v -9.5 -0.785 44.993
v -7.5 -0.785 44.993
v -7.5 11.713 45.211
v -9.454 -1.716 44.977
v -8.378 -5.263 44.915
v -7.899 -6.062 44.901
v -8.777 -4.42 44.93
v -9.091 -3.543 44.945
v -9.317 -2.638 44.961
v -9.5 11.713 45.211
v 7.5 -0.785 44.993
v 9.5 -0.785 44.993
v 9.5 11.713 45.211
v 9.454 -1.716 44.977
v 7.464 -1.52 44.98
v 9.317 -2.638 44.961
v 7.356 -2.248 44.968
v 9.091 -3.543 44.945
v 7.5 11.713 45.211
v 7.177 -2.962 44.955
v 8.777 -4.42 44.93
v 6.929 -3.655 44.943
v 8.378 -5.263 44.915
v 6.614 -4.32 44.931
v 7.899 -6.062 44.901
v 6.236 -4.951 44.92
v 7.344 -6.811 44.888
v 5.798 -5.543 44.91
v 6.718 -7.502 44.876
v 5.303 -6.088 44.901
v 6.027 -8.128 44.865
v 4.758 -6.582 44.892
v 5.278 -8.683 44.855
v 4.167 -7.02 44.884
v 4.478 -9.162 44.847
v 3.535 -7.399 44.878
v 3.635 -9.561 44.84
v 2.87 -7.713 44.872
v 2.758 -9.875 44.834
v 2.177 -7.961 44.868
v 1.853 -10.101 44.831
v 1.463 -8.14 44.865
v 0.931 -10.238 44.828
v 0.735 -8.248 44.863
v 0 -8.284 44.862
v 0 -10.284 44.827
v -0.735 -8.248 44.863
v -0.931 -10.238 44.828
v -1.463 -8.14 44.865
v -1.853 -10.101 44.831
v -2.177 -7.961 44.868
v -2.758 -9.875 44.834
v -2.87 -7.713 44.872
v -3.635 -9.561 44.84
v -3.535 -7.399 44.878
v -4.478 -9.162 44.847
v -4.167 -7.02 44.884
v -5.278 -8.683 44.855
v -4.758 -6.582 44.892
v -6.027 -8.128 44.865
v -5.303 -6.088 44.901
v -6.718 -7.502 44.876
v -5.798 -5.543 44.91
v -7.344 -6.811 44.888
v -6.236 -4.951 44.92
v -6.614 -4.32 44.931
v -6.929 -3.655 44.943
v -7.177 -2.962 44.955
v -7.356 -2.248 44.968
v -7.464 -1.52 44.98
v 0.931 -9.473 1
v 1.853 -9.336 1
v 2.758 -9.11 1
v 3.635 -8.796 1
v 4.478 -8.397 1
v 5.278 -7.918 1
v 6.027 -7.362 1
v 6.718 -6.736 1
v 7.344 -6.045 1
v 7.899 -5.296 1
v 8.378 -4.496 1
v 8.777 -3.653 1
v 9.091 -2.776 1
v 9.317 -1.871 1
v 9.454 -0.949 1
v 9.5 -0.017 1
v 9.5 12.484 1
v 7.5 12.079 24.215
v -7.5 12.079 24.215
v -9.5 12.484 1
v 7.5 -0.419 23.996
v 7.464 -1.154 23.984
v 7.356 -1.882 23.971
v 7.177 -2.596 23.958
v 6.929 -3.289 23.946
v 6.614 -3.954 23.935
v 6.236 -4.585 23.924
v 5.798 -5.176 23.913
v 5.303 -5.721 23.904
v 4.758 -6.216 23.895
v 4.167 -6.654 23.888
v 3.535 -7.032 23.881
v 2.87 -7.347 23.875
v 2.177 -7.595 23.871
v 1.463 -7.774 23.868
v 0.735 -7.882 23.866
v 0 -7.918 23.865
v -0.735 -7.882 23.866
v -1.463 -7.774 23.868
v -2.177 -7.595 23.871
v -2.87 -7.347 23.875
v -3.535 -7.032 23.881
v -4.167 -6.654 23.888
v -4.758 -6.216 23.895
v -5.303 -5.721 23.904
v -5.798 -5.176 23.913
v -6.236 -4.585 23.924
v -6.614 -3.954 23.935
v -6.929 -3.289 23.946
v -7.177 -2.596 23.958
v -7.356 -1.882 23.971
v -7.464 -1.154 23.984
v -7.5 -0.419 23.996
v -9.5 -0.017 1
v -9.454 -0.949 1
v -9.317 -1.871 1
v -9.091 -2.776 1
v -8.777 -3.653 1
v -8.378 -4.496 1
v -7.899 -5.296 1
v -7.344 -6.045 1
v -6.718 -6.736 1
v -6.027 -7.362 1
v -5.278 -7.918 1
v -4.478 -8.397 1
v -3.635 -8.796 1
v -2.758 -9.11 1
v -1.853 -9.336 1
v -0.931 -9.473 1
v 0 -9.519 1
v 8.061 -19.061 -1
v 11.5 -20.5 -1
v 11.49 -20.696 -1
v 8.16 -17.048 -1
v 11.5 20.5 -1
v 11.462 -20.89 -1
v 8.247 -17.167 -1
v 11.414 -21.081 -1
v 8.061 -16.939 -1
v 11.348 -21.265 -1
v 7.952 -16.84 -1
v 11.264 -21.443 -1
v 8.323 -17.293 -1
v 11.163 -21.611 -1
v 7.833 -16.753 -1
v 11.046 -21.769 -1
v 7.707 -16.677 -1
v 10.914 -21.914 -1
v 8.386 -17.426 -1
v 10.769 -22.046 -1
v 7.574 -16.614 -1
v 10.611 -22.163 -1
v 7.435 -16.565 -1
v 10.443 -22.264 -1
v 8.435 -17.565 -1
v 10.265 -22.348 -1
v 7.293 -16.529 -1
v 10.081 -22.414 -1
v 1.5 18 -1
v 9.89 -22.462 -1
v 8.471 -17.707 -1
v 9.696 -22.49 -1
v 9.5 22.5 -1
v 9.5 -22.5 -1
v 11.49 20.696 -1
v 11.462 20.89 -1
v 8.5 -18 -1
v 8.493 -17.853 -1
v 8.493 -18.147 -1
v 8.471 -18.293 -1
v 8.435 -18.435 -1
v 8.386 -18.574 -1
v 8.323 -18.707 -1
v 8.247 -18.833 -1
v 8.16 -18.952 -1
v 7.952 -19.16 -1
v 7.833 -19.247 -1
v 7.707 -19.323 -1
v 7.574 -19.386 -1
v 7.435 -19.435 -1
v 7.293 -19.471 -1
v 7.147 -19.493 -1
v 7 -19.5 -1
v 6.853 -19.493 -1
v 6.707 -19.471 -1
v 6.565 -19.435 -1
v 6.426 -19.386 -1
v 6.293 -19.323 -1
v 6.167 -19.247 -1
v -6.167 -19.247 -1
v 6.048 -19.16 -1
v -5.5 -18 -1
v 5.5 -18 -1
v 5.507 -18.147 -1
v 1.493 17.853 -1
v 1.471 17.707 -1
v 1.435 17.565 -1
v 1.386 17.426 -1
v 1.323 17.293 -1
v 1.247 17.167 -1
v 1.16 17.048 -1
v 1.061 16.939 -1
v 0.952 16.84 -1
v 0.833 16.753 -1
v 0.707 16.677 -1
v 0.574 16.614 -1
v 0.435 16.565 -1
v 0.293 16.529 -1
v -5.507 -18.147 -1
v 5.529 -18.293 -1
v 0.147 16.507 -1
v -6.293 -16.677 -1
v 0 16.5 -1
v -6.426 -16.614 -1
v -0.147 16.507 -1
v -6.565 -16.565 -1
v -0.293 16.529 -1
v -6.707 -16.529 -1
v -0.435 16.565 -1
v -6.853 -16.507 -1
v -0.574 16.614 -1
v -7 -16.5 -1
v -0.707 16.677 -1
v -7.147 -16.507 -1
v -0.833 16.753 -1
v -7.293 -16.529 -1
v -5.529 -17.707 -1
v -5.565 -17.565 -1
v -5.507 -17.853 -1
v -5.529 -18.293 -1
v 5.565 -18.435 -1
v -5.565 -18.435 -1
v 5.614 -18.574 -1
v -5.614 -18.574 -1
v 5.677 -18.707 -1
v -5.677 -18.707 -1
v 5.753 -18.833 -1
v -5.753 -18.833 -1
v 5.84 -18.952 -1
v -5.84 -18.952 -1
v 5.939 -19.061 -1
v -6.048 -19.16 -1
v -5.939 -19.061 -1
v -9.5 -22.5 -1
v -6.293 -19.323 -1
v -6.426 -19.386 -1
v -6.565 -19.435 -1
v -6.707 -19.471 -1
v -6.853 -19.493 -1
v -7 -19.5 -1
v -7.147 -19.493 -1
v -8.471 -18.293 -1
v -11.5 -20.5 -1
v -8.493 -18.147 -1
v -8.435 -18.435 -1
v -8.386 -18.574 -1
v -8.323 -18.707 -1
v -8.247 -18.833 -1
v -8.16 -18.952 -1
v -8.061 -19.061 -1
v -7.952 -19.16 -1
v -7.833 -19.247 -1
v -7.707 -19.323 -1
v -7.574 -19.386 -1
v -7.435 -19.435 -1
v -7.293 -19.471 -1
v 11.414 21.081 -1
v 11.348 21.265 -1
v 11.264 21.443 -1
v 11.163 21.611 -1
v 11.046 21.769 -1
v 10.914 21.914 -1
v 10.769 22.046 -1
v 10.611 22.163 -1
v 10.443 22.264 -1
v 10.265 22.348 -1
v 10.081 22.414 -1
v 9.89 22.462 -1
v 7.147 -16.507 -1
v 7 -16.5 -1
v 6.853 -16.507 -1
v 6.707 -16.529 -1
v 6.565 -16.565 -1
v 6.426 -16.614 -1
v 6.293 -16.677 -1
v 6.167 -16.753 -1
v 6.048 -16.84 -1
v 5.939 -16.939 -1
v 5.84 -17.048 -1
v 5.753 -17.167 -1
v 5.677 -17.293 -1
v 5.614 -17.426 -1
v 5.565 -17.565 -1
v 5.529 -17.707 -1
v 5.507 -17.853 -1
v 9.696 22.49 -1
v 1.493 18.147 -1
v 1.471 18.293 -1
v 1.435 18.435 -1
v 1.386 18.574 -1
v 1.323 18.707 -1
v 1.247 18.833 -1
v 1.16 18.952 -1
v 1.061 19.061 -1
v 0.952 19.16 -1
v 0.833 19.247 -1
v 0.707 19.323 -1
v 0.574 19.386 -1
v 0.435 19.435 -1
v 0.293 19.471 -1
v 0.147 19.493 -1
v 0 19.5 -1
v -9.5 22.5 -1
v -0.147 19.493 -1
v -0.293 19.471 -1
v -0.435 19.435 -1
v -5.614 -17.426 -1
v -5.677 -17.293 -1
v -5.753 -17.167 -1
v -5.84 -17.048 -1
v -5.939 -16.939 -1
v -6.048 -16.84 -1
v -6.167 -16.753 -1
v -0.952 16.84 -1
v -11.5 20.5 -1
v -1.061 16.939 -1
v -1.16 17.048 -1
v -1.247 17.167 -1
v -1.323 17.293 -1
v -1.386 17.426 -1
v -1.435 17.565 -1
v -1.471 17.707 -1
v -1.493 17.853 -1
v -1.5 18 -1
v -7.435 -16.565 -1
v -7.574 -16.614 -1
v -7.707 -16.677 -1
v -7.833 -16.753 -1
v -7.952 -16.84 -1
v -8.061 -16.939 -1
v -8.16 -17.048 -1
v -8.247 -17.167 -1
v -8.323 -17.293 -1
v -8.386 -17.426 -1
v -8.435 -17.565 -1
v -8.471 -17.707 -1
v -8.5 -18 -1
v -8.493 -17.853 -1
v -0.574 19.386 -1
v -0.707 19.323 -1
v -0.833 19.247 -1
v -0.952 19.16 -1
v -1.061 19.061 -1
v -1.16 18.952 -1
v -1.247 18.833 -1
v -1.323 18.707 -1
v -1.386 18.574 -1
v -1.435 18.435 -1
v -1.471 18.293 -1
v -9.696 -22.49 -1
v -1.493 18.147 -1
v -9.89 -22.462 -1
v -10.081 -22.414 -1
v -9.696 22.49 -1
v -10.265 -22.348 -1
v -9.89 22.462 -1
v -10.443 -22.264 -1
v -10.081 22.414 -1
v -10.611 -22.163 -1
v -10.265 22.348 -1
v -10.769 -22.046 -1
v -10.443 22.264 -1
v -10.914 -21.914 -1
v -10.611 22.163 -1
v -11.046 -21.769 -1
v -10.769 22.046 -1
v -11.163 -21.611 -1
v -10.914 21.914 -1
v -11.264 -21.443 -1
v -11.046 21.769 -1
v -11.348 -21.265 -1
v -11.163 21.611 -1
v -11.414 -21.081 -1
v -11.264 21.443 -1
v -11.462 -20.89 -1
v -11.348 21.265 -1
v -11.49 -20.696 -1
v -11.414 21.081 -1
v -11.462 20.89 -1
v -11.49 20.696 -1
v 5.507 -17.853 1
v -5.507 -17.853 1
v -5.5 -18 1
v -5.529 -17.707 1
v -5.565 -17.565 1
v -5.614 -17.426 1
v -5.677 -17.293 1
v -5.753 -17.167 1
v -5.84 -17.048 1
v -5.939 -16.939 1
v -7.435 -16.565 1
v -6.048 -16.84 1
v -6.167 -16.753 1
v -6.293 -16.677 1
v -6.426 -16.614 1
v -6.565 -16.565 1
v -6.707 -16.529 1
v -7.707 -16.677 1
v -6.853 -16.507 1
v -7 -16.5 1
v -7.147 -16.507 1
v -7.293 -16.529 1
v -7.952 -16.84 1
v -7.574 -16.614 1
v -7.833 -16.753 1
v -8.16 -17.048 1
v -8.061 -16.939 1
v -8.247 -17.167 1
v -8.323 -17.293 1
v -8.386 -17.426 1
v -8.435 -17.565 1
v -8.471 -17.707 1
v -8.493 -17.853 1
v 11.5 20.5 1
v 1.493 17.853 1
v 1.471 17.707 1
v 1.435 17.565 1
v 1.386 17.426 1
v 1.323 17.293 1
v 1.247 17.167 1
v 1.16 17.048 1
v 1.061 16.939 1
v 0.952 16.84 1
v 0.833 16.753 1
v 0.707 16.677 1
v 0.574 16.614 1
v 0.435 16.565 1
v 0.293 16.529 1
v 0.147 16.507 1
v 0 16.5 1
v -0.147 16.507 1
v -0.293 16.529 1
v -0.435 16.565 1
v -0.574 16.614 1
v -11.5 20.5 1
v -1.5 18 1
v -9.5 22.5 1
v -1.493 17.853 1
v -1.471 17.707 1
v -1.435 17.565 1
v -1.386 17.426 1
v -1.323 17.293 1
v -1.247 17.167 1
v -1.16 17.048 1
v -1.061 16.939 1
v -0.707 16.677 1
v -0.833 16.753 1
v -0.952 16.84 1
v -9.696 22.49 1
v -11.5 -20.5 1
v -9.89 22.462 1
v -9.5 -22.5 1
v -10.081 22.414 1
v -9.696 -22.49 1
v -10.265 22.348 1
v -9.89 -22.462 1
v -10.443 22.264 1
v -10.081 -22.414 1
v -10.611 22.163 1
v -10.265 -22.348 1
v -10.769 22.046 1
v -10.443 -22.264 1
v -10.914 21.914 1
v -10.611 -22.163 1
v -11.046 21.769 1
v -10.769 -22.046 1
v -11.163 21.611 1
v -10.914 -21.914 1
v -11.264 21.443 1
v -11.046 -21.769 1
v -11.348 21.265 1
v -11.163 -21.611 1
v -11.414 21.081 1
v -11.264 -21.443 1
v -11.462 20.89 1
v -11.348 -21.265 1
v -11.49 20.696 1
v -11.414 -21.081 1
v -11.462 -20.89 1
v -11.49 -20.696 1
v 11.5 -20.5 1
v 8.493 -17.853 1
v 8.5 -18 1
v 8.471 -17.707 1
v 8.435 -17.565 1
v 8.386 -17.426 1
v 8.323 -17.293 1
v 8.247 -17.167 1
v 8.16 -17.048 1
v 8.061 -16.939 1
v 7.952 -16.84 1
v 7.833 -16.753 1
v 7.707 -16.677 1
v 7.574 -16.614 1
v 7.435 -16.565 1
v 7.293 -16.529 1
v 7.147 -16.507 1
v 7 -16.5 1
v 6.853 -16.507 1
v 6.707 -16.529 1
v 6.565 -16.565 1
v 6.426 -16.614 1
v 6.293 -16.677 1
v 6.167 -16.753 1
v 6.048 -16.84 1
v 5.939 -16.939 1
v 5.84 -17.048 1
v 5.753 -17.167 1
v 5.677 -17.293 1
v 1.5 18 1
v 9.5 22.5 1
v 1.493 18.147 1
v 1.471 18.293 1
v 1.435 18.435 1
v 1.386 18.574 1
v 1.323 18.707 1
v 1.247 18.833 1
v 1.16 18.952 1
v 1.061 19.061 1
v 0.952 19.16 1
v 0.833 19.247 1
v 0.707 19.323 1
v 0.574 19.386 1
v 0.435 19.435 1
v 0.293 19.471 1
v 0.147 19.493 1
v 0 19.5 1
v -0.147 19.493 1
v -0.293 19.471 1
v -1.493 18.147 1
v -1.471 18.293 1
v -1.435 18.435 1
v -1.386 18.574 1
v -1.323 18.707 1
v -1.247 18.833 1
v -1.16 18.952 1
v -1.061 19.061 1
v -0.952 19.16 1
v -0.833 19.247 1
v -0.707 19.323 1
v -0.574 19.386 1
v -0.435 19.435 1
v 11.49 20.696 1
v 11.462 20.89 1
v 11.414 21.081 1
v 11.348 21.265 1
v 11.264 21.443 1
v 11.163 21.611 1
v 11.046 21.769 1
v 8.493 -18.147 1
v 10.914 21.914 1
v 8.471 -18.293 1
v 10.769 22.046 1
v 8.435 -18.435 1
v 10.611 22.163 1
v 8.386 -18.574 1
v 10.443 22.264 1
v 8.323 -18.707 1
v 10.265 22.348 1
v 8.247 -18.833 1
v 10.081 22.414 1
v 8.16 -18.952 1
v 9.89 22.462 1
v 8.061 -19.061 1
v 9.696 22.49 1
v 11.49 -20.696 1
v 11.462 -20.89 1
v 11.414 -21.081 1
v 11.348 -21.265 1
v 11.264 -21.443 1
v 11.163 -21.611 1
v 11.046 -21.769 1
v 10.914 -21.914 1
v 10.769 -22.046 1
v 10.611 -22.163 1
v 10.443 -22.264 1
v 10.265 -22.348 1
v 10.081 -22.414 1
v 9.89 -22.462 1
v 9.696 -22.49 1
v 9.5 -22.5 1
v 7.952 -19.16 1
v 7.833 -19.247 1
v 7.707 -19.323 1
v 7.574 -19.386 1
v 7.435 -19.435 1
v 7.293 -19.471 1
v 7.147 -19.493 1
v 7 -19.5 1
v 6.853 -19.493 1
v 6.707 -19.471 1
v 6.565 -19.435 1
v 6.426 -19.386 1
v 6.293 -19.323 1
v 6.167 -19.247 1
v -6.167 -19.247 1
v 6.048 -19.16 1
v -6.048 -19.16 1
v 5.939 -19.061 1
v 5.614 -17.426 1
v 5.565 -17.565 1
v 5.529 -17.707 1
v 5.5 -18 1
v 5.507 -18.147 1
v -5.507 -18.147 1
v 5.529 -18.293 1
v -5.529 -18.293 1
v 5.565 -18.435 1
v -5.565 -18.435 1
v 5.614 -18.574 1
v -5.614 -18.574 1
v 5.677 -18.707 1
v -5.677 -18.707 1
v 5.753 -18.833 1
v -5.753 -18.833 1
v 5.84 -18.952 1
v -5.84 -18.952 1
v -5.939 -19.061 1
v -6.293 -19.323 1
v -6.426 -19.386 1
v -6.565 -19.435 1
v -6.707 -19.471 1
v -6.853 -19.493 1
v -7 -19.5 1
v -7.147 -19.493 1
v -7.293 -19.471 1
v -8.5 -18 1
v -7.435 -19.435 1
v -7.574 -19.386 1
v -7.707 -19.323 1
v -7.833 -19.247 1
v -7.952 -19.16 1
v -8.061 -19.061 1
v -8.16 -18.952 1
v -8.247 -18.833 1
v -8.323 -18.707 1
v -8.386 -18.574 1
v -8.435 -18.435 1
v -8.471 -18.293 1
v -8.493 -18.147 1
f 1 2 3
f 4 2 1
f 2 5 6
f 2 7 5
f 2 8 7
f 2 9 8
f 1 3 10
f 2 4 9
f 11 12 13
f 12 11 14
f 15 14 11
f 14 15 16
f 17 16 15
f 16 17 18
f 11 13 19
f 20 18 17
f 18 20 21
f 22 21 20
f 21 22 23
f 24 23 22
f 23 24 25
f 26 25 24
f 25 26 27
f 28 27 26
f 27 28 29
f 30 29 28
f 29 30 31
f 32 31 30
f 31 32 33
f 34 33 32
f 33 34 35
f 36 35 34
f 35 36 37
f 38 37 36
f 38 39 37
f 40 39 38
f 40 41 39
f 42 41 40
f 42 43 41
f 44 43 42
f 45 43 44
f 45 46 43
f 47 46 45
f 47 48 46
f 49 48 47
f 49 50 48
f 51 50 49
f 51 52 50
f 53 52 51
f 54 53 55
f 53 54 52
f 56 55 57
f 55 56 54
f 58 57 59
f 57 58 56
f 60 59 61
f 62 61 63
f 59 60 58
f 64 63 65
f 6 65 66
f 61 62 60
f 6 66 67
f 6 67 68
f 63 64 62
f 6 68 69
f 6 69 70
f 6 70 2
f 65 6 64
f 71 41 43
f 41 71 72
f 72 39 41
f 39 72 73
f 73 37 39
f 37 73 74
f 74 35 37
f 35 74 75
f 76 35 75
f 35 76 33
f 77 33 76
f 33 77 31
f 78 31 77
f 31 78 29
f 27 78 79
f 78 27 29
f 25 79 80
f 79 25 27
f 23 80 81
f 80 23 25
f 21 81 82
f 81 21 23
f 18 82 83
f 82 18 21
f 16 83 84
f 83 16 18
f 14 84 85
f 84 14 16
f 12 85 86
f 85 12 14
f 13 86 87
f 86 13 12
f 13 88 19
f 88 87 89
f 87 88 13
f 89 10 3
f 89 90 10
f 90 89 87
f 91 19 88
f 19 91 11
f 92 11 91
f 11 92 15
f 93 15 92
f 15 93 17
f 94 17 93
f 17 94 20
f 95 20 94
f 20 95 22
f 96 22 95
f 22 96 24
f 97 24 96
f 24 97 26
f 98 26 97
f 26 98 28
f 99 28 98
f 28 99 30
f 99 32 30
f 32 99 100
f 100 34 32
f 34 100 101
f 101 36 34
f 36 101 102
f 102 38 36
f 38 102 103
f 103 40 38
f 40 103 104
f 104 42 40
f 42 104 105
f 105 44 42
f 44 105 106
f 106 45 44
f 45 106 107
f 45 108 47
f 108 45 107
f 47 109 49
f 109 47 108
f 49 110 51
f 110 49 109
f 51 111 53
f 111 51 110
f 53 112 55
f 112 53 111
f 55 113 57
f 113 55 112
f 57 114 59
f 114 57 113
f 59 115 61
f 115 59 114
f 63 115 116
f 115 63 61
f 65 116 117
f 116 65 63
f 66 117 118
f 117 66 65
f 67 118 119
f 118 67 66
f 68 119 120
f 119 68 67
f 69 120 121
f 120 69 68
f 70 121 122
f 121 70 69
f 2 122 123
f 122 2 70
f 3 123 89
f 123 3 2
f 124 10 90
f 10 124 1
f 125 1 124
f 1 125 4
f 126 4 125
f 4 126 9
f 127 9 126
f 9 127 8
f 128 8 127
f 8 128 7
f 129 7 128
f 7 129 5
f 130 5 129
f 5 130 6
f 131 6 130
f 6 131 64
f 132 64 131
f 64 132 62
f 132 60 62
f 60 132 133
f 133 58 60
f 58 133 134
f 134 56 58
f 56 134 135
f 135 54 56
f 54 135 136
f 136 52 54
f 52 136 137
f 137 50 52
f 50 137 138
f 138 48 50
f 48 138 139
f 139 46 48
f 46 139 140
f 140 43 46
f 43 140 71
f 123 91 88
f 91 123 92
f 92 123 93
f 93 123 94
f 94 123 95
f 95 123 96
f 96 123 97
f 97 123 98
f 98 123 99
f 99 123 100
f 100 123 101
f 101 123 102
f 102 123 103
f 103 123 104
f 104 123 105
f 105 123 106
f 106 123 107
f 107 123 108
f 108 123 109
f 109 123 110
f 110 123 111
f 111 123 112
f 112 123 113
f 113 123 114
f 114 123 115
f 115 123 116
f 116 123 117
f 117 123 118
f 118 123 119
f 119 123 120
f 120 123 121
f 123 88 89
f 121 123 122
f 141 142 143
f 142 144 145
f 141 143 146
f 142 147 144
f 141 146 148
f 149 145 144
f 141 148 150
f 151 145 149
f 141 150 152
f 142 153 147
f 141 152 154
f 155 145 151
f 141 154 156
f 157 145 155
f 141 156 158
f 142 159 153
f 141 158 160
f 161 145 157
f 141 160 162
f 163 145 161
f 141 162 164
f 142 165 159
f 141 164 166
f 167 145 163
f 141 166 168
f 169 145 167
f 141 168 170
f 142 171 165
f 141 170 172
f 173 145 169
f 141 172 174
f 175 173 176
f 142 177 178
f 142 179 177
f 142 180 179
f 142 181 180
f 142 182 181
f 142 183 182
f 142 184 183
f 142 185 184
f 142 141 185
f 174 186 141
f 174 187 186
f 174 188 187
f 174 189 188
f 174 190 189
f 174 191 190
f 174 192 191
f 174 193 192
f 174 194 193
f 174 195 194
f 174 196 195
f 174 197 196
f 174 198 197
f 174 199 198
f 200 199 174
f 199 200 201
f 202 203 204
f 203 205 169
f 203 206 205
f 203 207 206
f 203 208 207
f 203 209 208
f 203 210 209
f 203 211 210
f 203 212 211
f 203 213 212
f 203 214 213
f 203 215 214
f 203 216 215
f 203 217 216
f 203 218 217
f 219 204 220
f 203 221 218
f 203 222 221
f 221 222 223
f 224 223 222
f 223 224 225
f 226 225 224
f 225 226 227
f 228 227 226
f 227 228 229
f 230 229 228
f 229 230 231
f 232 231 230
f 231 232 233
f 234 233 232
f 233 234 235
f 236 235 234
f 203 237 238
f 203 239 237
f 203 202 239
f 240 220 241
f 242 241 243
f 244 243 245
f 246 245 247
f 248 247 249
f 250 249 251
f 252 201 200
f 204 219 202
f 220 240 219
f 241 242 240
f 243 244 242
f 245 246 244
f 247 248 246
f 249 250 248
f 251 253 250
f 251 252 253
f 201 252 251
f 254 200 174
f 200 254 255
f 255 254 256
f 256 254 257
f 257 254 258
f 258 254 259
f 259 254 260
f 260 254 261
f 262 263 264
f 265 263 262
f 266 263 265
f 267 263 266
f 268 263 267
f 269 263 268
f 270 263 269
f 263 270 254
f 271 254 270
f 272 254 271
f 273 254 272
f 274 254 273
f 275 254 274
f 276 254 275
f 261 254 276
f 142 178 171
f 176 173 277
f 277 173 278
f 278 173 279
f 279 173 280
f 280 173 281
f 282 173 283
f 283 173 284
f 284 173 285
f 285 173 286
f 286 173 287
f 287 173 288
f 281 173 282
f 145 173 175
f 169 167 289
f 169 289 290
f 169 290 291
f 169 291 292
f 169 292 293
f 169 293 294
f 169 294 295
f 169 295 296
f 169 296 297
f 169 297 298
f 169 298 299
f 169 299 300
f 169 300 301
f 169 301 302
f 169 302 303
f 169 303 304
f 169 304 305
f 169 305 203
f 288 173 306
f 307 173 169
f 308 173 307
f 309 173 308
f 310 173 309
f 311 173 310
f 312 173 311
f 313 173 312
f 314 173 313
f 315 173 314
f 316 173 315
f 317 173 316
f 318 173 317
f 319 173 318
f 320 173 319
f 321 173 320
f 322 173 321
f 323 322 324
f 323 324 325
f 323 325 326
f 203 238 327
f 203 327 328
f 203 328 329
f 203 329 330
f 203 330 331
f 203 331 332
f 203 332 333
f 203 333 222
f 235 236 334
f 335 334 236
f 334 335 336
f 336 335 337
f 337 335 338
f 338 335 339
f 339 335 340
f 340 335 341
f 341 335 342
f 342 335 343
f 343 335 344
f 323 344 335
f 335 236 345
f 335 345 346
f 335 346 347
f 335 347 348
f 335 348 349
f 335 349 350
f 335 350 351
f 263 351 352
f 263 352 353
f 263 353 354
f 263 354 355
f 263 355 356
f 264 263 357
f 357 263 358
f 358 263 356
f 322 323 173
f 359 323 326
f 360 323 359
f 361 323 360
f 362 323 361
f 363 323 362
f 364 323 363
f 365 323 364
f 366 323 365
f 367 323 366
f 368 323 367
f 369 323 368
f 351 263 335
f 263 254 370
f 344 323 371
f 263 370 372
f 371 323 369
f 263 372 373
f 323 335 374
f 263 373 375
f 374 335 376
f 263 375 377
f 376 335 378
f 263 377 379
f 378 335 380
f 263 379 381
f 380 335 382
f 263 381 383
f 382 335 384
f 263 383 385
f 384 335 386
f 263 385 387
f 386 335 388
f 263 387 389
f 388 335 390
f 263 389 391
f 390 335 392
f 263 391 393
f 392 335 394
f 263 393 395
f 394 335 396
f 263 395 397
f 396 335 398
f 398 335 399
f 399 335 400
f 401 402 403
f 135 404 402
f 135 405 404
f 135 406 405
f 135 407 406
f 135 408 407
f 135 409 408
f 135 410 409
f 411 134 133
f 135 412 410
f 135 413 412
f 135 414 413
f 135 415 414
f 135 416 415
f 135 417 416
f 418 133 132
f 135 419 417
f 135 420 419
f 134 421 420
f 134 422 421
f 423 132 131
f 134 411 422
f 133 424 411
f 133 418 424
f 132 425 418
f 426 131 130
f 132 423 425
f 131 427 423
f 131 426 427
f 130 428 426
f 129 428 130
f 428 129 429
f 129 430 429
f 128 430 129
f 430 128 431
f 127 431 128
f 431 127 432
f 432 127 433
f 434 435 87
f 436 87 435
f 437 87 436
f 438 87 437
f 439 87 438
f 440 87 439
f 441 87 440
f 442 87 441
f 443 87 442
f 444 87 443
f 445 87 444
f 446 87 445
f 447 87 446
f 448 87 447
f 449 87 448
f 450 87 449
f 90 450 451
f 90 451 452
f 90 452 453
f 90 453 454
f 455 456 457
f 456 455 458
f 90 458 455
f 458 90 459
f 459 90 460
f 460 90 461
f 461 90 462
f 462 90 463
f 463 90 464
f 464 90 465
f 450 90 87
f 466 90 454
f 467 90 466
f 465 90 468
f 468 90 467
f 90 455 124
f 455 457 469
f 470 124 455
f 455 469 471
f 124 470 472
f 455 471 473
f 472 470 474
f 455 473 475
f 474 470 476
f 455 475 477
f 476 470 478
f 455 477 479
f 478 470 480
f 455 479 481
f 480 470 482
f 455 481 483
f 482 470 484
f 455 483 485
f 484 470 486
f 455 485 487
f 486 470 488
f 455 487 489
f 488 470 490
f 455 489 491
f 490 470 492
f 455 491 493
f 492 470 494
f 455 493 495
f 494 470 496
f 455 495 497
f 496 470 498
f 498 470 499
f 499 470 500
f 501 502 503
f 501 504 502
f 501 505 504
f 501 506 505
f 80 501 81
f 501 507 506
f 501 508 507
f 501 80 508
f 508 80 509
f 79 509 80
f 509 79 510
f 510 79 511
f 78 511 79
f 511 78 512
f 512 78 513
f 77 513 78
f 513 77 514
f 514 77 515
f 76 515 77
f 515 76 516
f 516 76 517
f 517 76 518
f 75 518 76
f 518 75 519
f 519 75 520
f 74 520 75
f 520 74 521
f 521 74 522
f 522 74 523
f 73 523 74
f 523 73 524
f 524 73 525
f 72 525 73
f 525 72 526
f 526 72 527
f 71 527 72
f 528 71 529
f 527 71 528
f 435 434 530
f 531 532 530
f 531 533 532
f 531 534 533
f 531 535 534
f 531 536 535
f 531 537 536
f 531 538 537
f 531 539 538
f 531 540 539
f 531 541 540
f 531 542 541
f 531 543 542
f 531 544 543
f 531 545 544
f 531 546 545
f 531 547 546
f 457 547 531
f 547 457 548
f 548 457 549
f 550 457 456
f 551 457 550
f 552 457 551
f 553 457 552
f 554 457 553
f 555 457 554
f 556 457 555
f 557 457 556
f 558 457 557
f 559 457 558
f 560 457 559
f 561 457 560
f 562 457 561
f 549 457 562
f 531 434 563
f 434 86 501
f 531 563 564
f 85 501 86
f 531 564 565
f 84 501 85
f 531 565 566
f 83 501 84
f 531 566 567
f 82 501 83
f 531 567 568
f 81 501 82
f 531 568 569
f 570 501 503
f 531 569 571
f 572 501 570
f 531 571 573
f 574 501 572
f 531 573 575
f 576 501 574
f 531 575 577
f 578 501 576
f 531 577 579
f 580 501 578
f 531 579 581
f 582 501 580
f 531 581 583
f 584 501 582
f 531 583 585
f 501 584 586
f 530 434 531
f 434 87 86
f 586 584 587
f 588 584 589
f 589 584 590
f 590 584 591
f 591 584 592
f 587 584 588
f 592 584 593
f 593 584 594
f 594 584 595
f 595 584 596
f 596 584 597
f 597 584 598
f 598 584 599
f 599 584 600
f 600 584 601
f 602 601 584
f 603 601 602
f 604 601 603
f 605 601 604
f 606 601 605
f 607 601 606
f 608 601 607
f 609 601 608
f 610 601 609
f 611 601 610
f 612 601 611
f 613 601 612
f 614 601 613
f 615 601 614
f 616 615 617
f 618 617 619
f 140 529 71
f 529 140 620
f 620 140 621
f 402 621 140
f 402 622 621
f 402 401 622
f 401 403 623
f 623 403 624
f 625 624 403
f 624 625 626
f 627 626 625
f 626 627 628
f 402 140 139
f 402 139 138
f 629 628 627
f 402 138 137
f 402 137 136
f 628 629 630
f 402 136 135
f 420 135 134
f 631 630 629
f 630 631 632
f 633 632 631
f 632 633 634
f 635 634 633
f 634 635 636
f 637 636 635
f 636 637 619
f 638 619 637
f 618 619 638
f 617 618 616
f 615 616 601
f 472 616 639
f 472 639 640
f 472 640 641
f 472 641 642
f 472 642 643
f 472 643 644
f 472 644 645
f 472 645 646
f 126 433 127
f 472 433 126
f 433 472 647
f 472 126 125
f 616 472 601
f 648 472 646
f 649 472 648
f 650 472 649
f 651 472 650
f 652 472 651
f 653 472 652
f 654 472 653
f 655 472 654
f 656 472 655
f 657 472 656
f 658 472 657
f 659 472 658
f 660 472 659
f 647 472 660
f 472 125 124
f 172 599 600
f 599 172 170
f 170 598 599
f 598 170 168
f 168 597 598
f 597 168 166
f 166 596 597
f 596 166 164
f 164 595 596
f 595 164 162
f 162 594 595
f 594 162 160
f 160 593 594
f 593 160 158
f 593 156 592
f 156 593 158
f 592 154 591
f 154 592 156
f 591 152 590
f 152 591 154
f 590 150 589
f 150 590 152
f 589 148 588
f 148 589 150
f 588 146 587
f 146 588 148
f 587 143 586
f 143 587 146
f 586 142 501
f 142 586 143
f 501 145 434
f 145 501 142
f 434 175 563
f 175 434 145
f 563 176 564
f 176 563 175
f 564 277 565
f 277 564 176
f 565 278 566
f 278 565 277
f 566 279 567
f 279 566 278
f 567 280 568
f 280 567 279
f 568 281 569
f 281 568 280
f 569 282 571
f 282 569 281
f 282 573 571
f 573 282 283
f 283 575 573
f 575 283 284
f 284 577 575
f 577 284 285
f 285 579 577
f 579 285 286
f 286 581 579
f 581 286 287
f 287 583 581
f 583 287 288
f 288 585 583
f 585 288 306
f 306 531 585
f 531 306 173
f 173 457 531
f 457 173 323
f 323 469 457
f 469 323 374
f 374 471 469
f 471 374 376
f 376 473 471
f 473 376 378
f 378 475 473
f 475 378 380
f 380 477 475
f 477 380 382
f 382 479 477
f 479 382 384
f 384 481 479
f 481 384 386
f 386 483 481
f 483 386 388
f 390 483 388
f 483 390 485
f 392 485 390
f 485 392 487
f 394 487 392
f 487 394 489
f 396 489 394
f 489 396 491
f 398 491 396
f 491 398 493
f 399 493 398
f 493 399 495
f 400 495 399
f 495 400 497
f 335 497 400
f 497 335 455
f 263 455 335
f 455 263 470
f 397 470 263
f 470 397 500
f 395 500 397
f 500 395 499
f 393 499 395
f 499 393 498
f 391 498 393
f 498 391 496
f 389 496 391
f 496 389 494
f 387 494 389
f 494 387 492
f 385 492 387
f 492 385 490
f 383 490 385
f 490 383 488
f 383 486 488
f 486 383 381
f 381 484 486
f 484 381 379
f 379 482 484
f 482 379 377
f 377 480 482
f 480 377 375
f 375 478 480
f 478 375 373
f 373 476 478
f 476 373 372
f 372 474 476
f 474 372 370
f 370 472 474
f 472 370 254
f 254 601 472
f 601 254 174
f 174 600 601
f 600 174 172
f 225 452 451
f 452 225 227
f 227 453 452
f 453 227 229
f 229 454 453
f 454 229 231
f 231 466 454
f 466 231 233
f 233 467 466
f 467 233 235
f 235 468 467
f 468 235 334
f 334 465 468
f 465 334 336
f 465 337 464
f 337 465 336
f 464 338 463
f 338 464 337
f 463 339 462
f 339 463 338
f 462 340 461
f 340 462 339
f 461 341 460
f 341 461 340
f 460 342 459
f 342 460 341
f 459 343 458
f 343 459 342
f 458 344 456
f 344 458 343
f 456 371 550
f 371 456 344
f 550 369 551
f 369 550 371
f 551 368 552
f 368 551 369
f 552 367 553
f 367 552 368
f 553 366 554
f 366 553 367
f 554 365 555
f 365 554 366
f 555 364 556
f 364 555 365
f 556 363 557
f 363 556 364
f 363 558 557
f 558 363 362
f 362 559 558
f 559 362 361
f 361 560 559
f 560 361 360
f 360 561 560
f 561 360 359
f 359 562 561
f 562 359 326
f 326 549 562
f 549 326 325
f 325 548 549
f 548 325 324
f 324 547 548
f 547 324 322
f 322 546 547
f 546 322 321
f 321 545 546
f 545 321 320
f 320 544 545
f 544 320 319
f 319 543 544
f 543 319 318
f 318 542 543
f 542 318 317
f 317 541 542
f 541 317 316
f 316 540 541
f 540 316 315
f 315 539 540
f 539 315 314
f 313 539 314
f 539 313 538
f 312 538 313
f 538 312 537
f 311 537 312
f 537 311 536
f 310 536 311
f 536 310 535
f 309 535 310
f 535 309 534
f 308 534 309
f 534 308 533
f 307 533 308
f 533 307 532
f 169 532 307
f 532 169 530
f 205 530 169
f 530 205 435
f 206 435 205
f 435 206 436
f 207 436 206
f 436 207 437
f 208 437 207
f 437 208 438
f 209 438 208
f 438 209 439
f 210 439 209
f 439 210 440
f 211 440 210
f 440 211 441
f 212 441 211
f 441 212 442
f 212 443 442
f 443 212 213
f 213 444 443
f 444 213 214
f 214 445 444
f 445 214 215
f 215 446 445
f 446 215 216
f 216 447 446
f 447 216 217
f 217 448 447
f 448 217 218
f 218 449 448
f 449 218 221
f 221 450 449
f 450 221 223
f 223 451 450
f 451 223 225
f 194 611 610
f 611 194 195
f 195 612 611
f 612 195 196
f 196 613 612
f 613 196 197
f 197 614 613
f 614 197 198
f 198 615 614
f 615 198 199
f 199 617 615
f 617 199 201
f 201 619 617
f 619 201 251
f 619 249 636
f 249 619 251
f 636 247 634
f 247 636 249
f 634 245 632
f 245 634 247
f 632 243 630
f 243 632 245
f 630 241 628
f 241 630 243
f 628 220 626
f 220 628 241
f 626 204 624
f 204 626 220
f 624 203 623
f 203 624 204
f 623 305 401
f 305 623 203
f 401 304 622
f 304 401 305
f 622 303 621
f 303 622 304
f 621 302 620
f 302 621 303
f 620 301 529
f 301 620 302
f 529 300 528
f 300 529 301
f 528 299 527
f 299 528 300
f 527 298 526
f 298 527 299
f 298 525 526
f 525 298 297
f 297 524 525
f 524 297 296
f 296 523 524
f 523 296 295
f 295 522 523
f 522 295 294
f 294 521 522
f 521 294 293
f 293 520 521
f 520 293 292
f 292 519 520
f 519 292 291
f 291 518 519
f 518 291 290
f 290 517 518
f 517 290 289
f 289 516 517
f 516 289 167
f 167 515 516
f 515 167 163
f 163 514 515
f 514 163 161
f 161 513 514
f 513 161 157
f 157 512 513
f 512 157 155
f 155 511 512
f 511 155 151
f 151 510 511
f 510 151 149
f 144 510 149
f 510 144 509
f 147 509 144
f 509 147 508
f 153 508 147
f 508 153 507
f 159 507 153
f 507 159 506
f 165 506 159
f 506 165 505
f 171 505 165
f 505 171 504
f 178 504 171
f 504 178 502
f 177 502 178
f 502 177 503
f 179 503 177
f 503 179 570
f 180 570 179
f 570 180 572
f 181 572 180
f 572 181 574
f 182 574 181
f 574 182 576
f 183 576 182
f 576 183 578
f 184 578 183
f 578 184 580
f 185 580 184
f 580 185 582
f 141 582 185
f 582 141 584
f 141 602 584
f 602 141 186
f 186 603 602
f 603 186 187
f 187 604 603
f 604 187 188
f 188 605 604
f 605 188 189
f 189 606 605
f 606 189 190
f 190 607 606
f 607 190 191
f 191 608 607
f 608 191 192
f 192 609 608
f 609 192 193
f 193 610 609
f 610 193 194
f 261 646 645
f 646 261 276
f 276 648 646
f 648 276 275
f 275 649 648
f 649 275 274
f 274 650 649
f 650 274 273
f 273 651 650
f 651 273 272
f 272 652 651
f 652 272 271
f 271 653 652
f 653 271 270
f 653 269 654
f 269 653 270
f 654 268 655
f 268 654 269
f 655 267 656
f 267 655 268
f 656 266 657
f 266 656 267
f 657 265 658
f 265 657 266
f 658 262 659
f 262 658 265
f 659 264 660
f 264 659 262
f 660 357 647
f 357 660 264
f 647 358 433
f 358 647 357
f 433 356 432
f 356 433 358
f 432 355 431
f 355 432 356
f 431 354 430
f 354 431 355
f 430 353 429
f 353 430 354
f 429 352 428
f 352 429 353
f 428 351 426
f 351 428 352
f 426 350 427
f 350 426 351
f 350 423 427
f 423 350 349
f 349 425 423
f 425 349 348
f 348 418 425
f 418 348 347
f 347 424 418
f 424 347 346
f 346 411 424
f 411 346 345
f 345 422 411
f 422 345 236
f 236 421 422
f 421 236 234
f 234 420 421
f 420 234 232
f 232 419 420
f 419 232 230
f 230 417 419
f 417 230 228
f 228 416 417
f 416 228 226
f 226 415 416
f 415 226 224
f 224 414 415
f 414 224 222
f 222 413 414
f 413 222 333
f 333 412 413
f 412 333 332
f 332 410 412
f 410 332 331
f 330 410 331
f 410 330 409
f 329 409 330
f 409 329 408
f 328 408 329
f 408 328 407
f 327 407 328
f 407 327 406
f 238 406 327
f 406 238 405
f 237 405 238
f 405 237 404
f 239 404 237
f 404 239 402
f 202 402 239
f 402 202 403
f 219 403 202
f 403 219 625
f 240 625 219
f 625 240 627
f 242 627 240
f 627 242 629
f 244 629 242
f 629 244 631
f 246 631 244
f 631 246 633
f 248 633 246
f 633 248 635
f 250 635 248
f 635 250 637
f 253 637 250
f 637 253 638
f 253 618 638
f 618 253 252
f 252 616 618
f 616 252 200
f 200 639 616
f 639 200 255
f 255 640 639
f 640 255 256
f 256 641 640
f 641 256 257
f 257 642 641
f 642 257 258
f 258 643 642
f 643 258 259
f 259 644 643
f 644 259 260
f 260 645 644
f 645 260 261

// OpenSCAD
post_diameter = 15; //mm
trough_height = 20; //mm
trough_length = 45; //mm
shim = 24; //mm
thickness = 2; // mm
plate_height = 45; //mm
radius = 2; //mm
hole_diameter = 3; //mm

horiz_angle = -10; //degrees
vert_angle = 0; //degrees

width = post_diameter + 4 * thickness;
$fn = 64;

hanger(width, plate_height, radius, thickness,
       post_diameter, trough_height, trough_length,
       0, 1);

module hanger(width, plate_height, radius, thickness,
              post_diameter, trough_height, trough_length,
              horiz_angle, vert_angle) {
  union() {
    plate(width, plate_height, radius, thickness);
    trough(
          post_diameter,
          trough_height,
          trough_length,
          thickness,
          horiz_angle,
          vert_angle);
  }
}

module plate(w, h, radius, t) {
  linear_extrude(t, center=true) {
      difference() {
        minkowski() {
          square([w - 2 * radius, h - 2 * radius], center=true);
          circle(r=radius);
        }

        translate([w / 2 - 1.5 * hole_diameter, h / -2 + 1.5 * hole_diameter]) {
          circle(d=hole_diameter);
        }

        translate([w / -2 + 1.5 * hole_diameter, h / -2 + 1.5 * hole_diameter]) {
          circle(d=hole_diameter);
        }
        translate([0, h / 2 - 1.5 * hole_diameter]) {
          circle(d=hole_diameter);
        }
      }
  }
}

module trough(iw, ih, l, thickness, h_angle, v_angle) {
  difference() {
    rotate([v_angle, h_angle, 0]) {
      union() {
        linear_extrude(2 * l, center=true) {
            difference() {
              union() {
                circle(d=iw + 2 * thickness);
                translate([0, (ih - iw / 2) / 2]) {
                  square([iw + 2 * thickness, ih - iw / 2], center=true);
                }
            }
            union() {
              circle(d=iw);
              translate([0, ih / 2]) {
                square([iw, ih], center=true);
              }
            }
          }
        }

        // insert shim
        linear_extrude(2 * shim, center=true) {
          difference() {
            union() {
              circle(d=iw + 2 * thickness);
              translate([0, (ih - iw / 2) / 2]) {
                square([iw + 2 * thickness, ih - iw / 2], center=true);
              }
            }
          }
        }
      }
    }
    // cut off the bottom half
    translate([0, 0, -l/2 - thickness]) {
      cube([iw + ih + l, iw + ih + l, l + 2 * thickness], center=true);
    }
  }
}
